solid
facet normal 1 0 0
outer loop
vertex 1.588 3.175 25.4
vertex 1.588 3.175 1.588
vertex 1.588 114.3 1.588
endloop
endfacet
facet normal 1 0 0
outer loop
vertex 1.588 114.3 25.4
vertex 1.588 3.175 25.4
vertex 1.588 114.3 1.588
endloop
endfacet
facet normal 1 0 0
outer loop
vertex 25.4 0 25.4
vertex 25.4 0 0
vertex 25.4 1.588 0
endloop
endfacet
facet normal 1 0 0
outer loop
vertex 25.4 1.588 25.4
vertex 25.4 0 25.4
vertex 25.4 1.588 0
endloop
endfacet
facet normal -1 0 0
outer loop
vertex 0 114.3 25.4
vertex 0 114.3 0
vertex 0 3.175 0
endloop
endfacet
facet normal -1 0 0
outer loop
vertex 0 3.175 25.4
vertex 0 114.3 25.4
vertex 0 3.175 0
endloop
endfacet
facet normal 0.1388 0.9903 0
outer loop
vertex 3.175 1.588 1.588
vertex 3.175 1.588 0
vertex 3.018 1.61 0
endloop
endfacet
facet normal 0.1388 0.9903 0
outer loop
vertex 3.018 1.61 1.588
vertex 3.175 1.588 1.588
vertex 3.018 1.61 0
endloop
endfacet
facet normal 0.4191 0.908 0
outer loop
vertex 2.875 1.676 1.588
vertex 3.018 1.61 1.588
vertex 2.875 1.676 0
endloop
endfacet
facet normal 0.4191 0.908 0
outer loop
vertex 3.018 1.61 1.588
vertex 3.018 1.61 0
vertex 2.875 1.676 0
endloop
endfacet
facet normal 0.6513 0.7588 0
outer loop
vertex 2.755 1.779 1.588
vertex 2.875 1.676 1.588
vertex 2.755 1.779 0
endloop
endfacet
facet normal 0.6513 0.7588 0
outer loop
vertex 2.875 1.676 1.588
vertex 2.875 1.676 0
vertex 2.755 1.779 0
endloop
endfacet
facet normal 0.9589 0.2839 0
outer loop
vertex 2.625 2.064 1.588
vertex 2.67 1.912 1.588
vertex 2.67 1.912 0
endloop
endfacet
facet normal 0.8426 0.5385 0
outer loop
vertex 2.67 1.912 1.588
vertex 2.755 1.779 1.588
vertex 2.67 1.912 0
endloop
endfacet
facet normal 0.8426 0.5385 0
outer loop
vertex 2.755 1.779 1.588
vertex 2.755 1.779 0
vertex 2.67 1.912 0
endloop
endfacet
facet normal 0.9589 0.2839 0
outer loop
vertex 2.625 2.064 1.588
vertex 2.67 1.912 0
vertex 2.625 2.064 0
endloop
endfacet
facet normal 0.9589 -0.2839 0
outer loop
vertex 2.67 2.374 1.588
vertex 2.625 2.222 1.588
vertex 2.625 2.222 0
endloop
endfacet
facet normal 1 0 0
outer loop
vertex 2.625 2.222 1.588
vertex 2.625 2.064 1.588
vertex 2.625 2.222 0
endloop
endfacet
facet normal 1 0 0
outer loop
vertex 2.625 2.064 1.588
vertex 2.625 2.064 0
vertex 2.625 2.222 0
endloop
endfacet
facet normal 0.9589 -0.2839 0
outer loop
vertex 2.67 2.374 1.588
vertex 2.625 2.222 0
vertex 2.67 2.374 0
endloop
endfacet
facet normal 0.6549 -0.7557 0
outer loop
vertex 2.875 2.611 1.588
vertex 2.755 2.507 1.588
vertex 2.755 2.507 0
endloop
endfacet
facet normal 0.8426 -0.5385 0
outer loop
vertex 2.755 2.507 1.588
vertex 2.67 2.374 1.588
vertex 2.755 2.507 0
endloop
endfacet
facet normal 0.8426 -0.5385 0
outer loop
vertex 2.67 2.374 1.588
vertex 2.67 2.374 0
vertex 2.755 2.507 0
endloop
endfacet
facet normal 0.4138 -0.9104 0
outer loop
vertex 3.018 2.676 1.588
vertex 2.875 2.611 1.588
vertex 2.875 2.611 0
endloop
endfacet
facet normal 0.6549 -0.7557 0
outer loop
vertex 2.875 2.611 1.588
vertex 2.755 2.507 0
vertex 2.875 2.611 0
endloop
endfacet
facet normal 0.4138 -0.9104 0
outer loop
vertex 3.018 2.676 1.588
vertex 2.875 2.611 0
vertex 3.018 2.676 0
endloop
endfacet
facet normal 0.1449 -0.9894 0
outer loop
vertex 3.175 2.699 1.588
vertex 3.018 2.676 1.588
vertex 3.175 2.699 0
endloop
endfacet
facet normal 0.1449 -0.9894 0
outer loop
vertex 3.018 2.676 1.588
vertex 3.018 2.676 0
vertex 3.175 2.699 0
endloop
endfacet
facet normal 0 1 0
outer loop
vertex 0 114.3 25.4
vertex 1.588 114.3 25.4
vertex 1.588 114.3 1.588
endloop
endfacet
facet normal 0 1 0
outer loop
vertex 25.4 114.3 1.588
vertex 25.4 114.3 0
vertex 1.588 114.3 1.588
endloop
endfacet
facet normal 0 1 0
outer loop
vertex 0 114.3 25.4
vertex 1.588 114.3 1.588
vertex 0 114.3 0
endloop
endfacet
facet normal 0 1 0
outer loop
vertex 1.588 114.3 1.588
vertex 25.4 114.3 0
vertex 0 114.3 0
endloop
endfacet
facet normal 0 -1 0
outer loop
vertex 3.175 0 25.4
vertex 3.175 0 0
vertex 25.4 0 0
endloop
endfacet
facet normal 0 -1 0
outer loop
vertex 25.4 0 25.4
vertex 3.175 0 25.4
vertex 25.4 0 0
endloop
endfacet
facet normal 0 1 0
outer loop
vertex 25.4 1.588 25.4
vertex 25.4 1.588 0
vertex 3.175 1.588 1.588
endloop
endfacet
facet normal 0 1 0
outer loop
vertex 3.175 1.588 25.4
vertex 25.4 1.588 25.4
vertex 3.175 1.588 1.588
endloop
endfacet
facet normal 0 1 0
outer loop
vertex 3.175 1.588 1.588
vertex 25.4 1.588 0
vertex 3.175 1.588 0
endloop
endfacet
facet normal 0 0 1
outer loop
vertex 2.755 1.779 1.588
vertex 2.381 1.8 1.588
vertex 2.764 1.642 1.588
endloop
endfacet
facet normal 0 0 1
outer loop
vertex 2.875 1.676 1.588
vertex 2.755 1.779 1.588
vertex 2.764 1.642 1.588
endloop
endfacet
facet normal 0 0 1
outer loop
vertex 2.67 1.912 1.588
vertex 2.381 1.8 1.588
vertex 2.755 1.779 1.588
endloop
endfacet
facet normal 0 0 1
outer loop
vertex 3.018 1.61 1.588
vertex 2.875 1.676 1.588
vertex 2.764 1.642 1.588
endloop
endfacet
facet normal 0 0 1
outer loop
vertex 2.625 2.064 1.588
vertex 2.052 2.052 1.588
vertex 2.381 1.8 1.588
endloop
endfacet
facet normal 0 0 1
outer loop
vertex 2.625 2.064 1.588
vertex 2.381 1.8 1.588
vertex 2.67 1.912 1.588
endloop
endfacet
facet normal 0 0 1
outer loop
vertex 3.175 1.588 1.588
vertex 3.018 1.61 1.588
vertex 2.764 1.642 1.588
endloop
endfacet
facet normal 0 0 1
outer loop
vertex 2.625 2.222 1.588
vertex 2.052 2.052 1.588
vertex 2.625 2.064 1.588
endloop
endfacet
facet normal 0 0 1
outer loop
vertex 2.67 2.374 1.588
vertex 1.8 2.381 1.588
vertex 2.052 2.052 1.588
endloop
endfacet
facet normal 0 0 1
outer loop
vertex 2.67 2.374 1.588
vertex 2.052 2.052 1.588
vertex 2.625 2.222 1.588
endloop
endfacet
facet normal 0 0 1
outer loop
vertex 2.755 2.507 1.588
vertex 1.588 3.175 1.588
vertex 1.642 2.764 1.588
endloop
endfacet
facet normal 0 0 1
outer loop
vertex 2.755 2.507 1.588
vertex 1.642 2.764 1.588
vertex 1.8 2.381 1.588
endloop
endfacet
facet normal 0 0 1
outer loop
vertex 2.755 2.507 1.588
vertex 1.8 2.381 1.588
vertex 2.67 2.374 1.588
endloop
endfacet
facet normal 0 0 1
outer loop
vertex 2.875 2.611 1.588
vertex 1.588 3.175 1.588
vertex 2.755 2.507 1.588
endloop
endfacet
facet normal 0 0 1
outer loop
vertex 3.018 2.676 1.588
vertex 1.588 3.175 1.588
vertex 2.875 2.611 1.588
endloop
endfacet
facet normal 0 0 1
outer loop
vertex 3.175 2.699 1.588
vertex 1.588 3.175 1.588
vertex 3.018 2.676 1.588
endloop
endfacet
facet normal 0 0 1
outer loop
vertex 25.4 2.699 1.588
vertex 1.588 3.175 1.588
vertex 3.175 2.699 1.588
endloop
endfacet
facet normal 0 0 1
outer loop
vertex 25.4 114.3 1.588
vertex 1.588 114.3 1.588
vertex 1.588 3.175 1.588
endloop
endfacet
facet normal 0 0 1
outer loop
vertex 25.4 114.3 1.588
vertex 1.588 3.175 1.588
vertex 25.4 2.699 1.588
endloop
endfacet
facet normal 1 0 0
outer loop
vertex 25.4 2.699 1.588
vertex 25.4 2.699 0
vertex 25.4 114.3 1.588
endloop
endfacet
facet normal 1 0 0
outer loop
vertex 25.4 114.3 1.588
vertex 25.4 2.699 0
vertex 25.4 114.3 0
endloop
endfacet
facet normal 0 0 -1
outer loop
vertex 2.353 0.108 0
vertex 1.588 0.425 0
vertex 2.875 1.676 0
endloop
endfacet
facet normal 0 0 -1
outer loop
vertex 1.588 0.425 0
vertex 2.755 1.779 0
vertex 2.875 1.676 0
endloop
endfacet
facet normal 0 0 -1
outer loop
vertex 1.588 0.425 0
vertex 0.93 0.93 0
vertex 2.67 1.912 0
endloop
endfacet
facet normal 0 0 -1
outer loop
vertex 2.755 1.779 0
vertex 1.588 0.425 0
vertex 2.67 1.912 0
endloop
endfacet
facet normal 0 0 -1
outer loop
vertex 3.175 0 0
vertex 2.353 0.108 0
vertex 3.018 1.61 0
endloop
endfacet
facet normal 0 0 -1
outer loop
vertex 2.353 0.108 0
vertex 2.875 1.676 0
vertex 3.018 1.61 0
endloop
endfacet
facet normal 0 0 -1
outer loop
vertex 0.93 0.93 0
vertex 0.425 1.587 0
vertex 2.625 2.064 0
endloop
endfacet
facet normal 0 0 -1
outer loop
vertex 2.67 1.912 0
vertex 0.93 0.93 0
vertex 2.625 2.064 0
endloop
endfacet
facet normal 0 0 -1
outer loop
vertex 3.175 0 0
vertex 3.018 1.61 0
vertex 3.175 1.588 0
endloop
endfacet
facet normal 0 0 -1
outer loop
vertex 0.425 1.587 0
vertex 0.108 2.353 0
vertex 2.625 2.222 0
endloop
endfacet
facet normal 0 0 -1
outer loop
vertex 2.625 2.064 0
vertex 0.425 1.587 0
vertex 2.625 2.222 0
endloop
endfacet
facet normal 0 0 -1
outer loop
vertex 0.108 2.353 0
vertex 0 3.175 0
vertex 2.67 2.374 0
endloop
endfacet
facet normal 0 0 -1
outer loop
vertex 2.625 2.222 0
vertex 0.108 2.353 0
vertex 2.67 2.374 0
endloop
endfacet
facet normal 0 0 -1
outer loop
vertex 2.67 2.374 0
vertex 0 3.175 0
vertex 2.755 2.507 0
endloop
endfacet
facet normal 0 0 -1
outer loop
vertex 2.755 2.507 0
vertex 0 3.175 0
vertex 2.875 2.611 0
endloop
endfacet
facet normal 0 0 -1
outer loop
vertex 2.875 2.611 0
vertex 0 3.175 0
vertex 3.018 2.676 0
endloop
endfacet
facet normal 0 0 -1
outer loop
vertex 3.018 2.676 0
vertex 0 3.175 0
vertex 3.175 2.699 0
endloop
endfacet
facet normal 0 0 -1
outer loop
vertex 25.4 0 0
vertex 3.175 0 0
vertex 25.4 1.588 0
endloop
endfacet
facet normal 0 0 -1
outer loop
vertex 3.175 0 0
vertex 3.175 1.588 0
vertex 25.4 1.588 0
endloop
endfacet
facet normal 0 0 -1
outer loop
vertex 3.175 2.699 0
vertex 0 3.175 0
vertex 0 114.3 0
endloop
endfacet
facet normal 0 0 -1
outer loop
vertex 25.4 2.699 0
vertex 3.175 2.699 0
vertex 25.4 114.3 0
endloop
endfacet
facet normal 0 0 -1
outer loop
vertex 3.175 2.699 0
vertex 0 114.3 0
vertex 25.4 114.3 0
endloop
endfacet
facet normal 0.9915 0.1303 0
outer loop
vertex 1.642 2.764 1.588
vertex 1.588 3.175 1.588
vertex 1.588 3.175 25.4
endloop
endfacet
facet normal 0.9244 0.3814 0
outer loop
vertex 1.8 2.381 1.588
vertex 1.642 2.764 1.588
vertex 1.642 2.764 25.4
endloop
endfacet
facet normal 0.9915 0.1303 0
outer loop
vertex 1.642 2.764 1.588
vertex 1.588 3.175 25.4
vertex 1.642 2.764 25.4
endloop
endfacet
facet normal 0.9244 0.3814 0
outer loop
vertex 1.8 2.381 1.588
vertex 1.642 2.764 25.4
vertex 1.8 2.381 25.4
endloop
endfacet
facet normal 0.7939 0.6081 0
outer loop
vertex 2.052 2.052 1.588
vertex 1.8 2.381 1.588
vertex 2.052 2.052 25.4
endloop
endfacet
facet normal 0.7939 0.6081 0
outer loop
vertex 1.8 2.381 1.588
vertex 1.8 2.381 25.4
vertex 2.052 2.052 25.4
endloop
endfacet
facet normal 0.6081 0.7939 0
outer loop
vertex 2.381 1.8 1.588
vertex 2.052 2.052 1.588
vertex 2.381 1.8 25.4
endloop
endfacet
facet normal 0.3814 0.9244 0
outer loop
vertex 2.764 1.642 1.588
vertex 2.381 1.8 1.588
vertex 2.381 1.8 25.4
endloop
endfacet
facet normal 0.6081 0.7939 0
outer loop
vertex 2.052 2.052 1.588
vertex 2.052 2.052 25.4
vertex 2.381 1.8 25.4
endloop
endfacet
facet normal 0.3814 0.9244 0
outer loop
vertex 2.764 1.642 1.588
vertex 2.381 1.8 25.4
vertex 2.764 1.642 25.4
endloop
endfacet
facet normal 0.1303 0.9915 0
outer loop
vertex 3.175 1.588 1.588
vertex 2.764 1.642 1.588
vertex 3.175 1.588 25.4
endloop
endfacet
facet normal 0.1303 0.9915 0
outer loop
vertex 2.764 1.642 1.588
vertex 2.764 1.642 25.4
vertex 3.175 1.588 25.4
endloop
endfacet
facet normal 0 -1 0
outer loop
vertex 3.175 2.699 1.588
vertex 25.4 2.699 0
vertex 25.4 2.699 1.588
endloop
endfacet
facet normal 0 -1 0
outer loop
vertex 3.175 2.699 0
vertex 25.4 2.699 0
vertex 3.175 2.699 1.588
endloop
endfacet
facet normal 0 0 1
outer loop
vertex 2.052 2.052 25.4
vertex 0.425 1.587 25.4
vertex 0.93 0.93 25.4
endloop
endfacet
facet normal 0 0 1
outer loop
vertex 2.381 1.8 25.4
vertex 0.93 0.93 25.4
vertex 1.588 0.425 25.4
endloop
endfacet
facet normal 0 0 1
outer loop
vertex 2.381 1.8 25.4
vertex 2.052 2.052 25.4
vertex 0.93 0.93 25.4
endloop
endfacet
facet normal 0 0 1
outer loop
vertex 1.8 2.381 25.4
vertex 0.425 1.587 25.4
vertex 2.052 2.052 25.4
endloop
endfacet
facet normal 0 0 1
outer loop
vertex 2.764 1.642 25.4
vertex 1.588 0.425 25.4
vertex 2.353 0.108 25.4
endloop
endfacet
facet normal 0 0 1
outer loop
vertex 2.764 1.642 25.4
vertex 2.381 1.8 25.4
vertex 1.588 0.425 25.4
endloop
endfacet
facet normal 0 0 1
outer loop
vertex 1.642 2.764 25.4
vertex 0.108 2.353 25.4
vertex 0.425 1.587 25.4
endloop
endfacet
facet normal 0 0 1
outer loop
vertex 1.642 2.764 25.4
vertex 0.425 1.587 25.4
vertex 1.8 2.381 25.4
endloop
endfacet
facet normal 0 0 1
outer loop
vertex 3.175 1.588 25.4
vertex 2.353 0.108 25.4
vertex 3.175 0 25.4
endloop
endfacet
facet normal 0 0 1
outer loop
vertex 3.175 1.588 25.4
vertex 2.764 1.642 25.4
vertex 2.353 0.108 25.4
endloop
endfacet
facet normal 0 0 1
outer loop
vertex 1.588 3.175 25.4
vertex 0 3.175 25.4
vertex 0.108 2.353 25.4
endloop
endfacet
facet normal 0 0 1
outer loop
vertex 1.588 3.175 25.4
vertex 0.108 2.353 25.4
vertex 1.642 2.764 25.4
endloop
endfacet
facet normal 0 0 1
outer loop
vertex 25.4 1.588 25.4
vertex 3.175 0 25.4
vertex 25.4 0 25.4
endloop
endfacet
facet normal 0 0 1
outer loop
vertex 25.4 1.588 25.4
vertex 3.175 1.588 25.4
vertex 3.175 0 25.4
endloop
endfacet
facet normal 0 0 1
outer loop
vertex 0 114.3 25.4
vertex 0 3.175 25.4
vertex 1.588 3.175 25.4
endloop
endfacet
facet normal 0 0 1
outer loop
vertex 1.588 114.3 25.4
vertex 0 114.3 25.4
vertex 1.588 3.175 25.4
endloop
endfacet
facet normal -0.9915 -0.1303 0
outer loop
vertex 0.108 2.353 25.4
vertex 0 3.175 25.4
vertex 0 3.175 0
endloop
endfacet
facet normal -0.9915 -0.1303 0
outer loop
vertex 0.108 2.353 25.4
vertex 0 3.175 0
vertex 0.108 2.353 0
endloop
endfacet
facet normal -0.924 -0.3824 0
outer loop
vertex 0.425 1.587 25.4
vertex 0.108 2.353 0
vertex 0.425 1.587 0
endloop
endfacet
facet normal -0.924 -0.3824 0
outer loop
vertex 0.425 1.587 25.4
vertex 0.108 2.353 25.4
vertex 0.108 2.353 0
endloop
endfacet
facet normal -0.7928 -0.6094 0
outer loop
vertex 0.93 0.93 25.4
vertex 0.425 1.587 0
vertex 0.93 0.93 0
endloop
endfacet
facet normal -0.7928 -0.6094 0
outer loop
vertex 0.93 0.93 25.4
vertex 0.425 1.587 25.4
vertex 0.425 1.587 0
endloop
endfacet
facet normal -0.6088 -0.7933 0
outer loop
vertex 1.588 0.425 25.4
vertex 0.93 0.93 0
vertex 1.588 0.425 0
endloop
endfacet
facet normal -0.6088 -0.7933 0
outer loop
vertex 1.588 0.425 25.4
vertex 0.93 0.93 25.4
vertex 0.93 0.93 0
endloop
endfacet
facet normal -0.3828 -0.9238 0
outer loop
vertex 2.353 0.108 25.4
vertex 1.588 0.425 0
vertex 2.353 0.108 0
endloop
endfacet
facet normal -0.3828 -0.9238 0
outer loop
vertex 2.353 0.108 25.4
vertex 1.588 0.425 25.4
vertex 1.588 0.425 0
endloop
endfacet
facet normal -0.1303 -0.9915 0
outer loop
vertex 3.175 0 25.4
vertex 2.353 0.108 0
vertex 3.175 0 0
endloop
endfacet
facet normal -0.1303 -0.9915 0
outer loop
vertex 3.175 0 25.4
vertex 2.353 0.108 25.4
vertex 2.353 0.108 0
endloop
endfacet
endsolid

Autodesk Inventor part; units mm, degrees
ref_plane "YZ Plane" through (0, 0, 0) normal (1, 0, 0) x (0, 1, 0)
ref_plane "XZ Plane" through (0, 0, 0) normal (0, 1, 0) x (-1, 0, 0)
ref_plane "XY Plane" through (0, 0, 0) normal (0, 0, 1) x (1, 0, 0)
sketch "Sketch1" plane through (0, 0, 0) normal (0, 0, 1) x (1, 0, 0)
  line L0 (0, 0) -> (25.4, 0)
  line L1 (25.4, 114.3) -> (0, 114.3)
  line L2 (0, 114.3) -> (0, 0)
  line L3 (25.4, 1.5875) -> (1.5875, 1.5875)
  line L4 (1.5875, 1.5875) -> (1.5875, 114.3)
  line L5 (25.4, 2.6988) -> (3.175, 2.6987)
  arc A0 (3.175, 2.6987) -> (3.175, 1.5875) centre (3.175, 2.1431) ccw
  line L6 (25.4, 0) -> (25.4, 1.5875)
  line L7 (25.4, 2.6988) -> (25.4, 114.3)
  dimension "d0" = 25.4
  dimension "d1" = 114.3
  dimension "d2" = 1.5875
  dimension "d3" = 1.5875
  dimension "d4" = 1.1113
  dimension "d5" = 1.5875
extrude "Extrusion1" add sketch "Sketch1" along normal blind 25.4 contours L2 L1 L4 L3 L6 L0
extrude "Extrusion2" add sketch "Sketch1" along normal blind 1.5875 contours L1 L7 L5 A0 L3 L4
fillet "Fillet1" radius 1.5875 1 edges at (1.5875, 1.5875, 13.4938)
fillet "Fillet2" radius 3.175 1 edges at (0, 0, 12.7)
equation "\"d2\" = d3"
equation "\"d4\" = 0.7 * d2"
properties part number "dozer side mid mount"
